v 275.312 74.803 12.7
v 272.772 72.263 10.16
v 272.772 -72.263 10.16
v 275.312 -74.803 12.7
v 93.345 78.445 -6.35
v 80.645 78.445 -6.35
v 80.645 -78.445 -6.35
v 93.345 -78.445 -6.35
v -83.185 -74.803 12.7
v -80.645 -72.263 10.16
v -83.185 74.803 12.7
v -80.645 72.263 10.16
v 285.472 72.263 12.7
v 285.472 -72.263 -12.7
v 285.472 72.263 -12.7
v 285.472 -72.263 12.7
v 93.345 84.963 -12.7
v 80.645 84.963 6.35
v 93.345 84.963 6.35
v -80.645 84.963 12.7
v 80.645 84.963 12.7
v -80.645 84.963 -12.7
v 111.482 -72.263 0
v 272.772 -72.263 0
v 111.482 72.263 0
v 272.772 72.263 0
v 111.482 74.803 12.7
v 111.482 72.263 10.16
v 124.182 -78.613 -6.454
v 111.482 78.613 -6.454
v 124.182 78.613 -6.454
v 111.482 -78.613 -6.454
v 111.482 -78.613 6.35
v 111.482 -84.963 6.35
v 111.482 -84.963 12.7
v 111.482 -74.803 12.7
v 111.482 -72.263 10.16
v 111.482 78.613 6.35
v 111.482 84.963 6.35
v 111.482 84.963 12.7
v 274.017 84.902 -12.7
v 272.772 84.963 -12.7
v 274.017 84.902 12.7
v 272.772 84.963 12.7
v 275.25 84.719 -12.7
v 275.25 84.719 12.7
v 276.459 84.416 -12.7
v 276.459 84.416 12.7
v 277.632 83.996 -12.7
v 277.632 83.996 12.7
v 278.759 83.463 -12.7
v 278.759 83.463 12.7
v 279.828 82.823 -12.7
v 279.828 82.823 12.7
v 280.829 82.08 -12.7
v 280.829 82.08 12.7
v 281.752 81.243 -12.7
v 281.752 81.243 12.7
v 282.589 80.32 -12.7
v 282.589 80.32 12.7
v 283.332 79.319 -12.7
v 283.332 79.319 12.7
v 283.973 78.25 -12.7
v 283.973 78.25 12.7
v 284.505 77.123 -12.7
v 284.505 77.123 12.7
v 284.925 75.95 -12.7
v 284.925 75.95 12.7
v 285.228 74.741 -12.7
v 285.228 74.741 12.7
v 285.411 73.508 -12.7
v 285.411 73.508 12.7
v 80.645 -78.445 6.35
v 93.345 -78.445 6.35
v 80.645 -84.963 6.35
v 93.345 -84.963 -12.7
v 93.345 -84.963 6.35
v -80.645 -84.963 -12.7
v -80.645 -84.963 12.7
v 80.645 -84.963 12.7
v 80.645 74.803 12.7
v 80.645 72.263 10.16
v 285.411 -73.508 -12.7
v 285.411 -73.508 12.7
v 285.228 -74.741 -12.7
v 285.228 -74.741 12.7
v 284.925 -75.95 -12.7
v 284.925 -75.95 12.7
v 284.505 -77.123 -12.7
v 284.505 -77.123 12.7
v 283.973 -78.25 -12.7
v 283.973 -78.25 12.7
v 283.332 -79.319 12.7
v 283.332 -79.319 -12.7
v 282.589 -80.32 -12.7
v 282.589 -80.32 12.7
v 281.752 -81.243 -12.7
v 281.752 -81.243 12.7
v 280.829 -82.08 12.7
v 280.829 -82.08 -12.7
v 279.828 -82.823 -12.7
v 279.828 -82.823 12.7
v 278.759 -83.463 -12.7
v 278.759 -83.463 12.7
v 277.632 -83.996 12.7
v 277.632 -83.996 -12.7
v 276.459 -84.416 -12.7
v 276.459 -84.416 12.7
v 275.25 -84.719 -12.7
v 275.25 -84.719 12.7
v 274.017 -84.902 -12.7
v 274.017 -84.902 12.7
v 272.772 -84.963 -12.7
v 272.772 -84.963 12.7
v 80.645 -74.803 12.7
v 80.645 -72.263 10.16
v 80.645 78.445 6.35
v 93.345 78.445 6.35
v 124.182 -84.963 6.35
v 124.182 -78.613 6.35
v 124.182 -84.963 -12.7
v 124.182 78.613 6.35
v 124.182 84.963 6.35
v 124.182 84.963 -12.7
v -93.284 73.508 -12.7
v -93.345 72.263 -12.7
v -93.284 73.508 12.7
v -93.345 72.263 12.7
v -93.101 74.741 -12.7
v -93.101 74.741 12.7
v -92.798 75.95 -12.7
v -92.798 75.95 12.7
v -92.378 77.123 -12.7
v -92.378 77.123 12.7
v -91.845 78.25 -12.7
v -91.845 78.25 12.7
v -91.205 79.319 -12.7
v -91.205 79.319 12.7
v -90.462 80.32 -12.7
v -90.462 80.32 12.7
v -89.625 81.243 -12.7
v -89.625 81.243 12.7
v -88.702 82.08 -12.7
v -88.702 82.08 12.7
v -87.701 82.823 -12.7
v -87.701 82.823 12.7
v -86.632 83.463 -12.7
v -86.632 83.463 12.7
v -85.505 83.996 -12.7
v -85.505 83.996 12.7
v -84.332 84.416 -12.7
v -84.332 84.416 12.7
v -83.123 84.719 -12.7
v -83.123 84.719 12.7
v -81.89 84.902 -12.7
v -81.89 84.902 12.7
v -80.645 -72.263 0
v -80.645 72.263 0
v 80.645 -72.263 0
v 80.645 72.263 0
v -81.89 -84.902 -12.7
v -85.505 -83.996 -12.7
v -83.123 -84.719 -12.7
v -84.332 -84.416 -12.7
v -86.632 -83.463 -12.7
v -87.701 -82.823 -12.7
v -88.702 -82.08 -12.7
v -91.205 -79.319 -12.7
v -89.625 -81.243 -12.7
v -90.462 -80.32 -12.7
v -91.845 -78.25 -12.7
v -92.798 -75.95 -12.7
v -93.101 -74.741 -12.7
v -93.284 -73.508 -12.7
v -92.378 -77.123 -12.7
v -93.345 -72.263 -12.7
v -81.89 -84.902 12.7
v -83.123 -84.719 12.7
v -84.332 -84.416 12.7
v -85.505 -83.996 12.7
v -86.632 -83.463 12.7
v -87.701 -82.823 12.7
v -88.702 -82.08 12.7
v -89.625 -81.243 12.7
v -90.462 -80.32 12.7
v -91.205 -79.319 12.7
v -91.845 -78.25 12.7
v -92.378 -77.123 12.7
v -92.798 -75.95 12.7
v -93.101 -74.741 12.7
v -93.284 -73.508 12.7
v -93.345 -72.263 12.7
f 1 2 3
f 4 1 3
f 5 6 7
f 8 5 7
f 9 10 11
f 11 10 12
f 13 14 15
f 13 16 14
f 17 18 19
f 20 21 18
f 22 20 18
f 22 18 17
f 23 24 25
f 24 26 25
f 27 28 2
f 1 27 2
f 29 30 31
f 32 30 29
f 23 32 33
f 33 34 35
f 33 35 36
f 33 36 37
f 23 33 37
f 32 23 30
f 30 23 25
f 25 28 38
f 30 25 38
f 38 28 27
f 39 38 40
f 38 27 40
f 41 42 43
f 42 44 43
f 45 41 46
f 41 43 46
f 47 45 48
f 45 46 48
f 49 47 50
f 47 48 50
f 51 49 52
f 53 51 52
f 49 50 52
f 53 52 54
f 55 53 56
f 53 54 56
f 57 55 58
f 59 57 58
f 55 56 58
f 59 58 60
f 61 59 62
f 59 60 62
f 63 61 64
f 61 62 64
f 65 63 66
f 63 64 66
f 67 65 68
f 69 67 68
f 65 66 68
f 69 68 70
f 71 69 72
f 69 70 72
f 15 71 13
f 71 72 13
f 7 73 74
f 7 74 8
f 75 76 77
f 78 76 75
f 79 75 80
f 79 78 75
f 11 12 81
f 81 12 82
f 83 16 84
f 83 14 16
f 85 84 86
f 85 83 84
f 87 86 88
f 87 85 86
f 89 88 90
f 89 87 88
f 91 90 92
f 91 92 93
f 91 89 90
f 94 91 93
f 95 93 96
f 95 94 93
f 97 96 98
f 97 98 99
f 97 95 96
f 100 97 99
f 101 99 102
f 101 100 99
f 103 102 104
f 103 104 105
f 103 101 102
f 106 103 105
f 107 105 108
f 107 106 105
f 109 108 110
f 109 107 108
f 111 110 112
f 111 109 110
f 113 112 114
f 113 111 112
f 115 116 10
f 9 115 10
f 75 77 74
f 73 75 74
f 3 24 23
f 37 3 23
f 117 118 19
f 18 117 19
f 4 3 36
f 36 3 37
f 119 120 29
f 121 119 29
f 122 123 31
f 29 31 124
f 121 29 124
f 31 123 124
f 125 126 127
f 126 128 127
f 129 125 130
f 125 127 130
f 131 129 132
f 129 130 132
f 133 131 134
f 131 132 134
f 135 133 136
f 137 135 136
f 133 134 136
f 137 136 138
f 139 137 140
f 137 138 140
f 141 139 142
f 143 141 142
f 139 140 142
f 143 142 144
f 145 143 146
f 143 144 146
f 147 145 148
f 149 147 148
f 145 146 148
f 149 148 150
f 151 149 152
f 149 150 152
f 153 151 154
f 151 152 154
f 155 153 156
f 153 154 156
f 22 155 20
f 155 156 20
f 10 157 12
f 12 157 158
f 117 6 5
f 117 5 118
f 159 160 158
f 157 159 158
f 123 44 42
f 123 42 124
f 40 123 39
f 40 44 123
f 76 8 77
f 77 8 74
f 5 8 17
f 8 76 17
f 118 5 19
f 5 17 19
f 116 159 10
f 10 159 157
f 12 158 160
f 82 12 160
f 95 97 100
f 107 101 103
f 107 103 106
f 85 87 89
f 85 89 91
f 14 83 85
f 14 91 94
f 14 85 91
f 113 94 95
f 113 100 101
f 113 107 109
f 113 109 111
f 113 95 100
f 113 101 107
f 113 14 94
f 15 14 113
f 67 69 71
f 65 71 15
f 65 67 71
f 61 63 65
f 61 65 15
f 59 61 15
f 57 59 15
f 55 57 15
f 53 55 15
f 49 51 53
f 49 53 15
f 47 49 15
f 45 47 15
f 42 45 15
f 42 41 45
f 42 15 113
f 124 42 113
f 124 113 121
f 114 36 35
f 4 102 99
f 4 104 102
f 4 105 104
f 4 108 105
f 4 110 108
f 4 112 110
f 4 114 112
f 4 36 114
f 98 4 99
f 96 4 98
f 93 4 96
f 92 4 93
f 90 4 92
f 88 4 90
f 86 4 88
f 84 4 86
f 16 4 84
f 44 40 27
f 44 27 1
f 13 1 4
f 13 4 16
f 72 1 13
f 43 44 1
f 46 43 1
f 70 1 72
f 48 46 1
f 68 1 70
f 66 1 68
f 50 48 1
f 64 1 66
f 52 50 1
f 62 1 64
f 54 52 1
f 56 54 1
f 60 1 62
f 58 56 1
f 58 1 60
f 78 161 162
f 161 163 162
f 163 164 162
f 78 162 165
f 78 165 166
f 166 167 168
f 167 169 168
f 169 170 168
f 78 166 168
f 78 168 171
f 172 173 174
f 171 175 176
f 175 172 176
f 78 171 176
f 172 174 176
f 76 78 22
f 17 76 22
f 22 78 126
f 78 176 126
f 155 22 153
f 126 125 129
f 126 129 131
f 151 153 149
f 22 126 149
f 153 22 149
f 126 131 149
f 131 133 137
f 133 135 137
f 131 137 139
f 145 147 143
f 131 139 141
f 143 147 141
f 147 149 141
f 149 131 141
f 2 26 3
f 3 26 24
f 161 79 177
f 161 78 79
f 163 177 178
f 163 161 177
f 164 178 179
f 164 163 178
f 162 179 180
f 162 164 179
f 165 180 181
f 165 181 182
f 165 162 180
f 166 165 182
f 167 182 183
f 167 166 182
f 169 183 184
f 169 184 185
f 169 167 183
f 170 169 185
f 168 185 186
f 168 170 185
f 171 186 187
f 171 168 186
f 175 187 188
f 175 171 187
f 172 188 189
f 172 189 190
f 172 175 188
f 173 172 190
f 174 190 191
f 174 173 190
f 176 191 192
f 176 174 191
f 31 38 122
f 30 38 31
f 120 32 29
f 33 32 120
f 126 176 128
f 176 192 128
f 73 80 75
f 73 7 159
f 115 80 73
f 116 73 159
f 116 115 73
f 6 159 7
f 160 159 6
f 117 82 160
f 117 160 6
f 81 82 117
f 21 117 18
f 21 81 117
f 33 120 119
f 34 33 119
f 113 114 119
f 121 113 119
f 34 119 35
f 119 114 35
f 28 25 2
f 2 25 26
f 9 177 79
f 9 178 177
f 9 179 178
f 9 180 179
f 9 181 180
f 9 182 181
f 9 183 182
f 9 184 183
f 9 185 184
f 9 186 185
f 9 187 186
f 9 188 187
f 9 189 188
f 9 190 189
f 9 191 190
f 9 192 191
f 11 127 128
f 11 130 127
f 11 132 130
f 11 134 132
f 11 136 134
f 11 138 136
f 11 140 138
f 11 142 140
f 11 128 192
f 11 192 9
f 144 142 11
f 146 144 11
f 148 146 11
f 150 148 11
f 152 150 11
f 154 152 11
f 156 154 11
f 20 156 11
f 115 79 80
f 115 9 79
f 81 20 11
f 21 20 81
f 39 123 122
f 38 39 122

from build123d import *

# Parameters (mm, degrees)
BOSS_EXTRUDE1_DEPTH = 12.7
SKETCH2_W           = 173.99
SKETCH2_H           = 169.926
BOSS_EXTRUDE2_DEPTH = 12.7
FILLET1_R           = 12.7
FILLET2_SIZE        = 2.54
BOSS_EXTRUDE5_DEPTH = 12.7
BOSS_EXTRUDE6_DEPTH = 12.7
SKETCH8_W           = 173.99
SKETCH8_H           = 169.926
BOSS_EXTRUDE7_DEPTH = 12.7
CUT_EXTRUDE1_DEPTH  = 12.7
CHAMFER1_SIZE       = 2.54
FILLET4_R           = 12.7


with BuildPart() as part:
    # Sketch1 → Boss-Extrude1 (new body)
    with BuildSketch(Plane.XY):
        Polygon((-80.645, 72.263), (80.645, 72.263), (80.645, 84.963), (-93.345, 84.963), (-93.345, -84.963), (80.645, -84.963), (80.645, -72.263), (-80.645, -72.263), align=None)
    extrude(amount=BOSS_EXTRUDE1_DEPTH)

    # Sketch2 → Boss-Extrude2 (add)
    with BuildSketch(Plane(origin=(0, 0, 0), x_dir=(-1, 0, 0), z_dir=(0, 0, -1))):
        with Locations((6.35, 0)):
            Rectangle(SKETCH2_W, SKETCH2_H)
    extrude(amount=BOSS_EXTRUDE2_DEPTH)

    # Fillet1
    fillet1_edges = [part.edges().sort_by_distance(p)[0] for p in [
        (-93.345, -84.963, 0),
        (-93.345, 84.963, 0),
    ]]
    fillet(fillet1_edges, radius=FILLET1_R)

    # Fillet2
    fillet2_edges = [part.edges().sort_by_distance(p)[0] for p in [
        (0, -72.263, 12.7),
        (-80.645, 0, 12.7),
        (0, 72.263, 12.7),
    ]]
    chamfer(fillet2_edges, length=FILLET2_SIZE)

    # Sketch6 → Boss-Extrude5 (add)
    with BuildSketch(Plane(origin=(80.645, 0, 0), x_dir=(0, 0, -1), z_dir=(1, 0, 0))):
        Polygon((-6.35, 84.963), (12.7, 84.963), (12.7, 65.913), (12.7, -65.913), (12.7, -84.963), (-6.35, -84.963), (-6.35, -78.445226504), (6.35, -78.445226504), (6.35, -65.659), (6.35, 65.659), (6.35, 78.445226504), (-6.35, 78.445226504), align=None)
    extrude(amount=BOSS_EXTRUDE5_DEPTH)


with BuildPart() as body_2:
    # Sketch7 → Boss-Extrude6 (new body)
    with BuildSketch(Plane.XY):
        Polygon((285.472121408, 84.963), (111.482121408, 84.963), (111.482121408, 72.263), (272.772121408, 72.263), (272.772121408, -72.263), (111.482121408, -72.263), (111.482121408, -84.963), (285.472121408, -84.963), align=None)
    extrude(amount=BOSS_EXTRUDE6_DEPTH)

    # Sketch8 → Boss-Extrude7 (add)
    with BuildSketch(Plane(origin=(0, 0, 0), x_dir=(-1, 0, 0), z_dir=(0, 0, -1))):
        with Locations((-198.477121408, 0)):
            Rectangle(SKETCH8_W, SKETCH8_H)
    extrude(amount=BOSS_EXTRUDE7_DEPTH)

    # Sketch9 → Cut-Extrude1 (cut)
    with BuildSketch(Plane.ZY.offset(-111.482121408)):
        Polygon((-12.7, 84.963), (6.35, 84.963), (6.35, 78.613), (-6.454227482, 78.613), (-6.454227482, -78.613), (6.35, -78.613), (6.35, -84.963), (-12.7, -84.963), align=None)
    extrude(amount=-CUT_EXTRUDE1_DEPTH, mode=Mode.SUBTRACT)

    # Chamfer1
    chamfer1_edges = [body_2.edges().sort_by_distance(p)[0] for p in [
        (272.772121408, 0, 12.7),
        (192.127121408, -72.263, 12.7),
        (192.127121408, 72.263, 12.7),
    ]]
    chamfer(chamfer1_edges, length=CHAMFER1_SIZE)

    # Fillet4
    fillet4_edges = [body_2.edges().sort_by_distance(p)[0] for p in [
        (285.472121408, 84.963, 0),
        (285.472121408, -84.963, 0),
    ]]
    fillet(fillet4_edges, radius=FILLET4_R)


solid = Compound([part.part, body_2.part])
